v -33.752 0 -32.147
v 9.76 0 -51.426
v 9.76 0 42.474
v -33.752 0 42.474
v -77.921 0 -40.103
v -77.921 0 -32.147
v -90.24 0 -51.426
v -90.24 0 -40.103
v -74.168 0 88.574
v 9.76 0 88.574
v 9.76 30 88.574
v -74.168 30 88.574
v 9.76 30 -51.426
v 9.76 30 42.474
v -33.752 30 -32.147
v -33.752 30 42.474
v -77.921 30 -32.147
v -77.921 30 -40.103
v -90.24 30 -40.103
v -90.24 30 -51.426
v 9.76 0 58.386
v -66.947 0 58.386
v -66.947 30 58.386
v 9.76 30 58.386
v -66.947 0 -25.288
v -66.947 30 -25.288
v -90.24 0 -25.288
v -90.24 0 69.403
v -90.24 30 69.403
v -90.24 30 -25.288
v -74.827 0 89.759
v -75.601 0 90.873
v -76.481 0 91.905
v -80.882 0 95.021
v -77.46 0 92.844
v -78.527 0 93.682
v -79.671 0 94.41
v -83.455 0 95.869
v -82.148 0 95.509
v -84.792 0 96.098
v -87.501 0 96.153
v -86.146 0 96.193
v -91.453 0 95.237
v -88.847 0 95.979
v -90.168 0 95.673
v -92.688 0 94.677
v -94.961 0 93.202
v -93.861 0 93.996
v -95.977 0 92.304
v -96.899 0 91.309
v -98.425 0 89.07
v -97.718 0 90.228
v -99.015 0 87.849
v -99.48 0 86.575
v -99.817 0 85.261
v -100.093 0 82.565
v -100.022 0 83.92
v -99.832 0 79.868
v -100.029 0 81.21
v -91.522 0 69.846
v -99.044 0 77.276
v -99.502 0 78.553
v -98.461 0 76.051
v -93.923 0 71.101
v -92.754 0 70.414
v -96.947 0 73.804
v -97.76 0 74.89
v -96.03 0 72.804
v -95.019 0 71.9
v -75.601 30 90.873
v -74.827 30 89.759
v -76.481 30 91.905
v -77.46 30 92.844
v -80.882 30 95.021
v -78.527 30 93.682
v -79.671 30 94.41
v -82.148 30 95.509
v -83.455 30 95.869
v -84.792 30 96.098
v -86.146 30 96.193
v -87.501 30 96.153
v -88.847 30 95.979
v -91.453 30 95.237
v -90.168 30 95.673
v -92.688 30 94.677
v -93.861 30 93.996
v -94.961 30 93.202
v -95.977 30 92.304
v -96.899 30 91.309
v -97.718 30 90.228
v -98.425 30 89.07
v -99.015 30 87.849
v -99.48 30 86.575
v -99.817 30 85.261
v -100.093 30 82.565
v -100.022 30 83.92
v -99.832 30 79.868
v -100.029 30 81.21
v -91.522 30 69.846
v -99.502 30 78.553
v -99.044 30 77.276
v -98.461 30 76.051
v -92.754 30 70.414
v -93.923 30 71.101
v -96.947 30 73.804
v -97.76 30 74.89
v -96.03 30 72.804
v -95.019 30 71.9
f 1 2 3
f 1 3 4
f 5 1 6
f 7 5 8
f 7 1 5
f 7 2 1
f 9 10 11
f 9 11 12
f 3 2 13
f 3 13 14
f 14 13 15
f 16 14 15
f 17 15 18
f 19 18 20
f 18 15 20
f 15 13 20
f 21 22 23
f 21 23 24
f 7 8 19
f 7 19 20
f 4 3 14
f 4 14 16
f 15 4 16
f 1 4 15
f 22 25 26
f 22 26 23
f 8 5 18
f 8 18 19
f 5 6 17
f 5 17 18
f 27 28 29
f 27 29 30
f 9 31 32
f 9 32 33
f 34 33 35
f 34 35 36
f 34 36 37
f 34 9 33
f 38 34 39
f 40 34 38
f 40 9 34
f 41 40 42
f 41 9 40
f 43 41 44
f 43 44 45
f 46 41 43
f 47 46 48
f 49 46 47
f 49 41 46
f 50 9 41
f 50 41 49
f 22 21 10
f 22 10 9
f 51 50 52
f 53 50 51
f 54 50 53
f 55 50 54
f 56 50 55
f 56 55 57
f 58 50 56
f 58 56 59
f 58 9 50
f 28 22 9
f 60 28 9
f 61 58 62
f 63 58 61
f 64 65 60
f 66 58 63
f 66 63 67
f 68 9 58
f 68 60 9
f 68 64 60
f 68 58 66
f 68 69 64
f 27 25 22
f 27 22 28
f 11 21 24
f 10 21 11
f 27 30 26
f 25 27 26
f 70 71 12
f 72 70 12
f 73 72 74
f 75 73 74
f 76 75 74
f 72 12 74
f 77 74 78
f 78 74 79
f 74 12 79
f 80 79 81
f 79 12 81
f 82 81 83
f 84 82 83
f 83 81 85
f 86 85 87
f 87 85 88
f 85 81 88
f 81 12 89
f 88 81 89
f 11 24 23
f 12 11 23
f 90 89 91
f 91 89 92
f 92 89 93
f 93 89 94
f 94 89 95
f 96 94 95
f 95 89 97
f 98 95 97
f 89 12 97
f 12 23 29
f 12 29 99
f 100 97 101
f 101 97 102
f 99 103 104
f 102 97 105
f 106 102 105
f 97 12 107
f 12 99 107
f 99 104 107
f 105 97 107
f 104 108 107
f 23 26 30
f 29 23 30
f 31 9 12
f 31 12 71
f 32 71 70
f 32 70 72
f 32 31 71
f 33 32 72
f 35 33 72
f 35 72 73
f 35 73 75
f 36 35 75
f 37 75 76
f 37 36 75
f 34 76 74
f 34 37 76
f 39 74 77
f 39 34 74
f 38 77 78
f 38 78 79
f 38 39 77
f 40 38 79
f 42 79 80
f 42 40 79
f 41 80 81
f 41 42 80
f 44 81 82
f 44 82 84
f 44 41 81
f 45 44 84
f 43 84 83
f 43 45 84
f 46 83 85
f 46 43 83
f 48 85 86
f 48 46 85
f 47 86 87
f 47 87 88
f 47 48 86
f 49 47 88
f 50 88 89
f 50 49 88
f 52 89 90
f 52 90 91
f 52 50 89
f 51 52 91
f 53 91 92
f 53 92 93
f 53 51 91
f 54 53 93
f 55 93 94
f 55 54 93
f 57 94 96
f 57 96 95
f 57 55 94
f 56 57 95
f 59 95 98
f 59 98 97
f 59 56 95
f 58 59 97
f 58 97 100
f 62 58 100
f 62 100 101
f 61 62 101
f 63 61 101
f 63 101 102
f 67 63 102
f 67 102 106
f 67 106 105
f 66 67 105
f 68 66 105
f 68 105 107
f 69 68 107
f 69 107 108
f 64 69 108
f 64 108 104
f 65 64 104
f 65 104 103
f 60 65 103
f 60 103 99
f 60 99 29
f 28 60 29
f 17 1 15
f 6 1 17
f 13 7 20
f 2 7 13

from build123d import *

# Parameters (mm, degrees)
EXTRUDE_1_DEPTH   = 30
EXTRUDE_1_2_DEPTH = 30


with BuildPart() as part:
    # 草图1 → 凸台-拉伸1 (new body)
    with BuildSketch(Plane(origin=(0, 0, 0), x_dir=(1, 0, 0), z_dir=(0, 1, 0))):
        with BuildLine():
            Line((-90.239511188, 25.288223499), (-66.947083746, 25.288223499))
            Line((-66.947083746, 25.288223499), (-66.947083746, -58.385910797))
            Line((-66.947083746, -58.385910797), (9.760488812, -58.385910797))
            Line((9.760488812, -58.385910797), (9.760488812, -88.573550981))
            Line((9.760488812, -88.573550981), (-74.167507467, -88.573550981))
            ThreePointArc((-74.167507467, -88.573550981), (-96.899000332, -91.308925643), (-90.239511188, -69.403349943))
            Line((-90.239511188, -69.403349943), (-90.239511188, 25.288223499))
        make_face()
    extrude(amount=EXTRUDE_1_DEPTH)


with BuildPart() as body_2:
    # 草图1 → Extrude 1 2 (new body)
    with BuildSketch(Plane(origin=(0, 0, 0), x_dir=(1, 0, 0), z_dir=(0, 1, 0))):
        Polygon((-90.239511188, 51.426449019), (9.760488812, 51.426449019), (9.760488812, -42.47410821), (-33.751771451, -42.47410821), (-33.751771451, 32.146759097), (-77.920740703, 32.146759097), (-77.920740703, 40.102660391), (-90.239511188, 40.102660391), align=None)
    extrude(amount=EXTRUDE_1_2_DEPTH)


solid = Compound([part.part, body_2.part])
